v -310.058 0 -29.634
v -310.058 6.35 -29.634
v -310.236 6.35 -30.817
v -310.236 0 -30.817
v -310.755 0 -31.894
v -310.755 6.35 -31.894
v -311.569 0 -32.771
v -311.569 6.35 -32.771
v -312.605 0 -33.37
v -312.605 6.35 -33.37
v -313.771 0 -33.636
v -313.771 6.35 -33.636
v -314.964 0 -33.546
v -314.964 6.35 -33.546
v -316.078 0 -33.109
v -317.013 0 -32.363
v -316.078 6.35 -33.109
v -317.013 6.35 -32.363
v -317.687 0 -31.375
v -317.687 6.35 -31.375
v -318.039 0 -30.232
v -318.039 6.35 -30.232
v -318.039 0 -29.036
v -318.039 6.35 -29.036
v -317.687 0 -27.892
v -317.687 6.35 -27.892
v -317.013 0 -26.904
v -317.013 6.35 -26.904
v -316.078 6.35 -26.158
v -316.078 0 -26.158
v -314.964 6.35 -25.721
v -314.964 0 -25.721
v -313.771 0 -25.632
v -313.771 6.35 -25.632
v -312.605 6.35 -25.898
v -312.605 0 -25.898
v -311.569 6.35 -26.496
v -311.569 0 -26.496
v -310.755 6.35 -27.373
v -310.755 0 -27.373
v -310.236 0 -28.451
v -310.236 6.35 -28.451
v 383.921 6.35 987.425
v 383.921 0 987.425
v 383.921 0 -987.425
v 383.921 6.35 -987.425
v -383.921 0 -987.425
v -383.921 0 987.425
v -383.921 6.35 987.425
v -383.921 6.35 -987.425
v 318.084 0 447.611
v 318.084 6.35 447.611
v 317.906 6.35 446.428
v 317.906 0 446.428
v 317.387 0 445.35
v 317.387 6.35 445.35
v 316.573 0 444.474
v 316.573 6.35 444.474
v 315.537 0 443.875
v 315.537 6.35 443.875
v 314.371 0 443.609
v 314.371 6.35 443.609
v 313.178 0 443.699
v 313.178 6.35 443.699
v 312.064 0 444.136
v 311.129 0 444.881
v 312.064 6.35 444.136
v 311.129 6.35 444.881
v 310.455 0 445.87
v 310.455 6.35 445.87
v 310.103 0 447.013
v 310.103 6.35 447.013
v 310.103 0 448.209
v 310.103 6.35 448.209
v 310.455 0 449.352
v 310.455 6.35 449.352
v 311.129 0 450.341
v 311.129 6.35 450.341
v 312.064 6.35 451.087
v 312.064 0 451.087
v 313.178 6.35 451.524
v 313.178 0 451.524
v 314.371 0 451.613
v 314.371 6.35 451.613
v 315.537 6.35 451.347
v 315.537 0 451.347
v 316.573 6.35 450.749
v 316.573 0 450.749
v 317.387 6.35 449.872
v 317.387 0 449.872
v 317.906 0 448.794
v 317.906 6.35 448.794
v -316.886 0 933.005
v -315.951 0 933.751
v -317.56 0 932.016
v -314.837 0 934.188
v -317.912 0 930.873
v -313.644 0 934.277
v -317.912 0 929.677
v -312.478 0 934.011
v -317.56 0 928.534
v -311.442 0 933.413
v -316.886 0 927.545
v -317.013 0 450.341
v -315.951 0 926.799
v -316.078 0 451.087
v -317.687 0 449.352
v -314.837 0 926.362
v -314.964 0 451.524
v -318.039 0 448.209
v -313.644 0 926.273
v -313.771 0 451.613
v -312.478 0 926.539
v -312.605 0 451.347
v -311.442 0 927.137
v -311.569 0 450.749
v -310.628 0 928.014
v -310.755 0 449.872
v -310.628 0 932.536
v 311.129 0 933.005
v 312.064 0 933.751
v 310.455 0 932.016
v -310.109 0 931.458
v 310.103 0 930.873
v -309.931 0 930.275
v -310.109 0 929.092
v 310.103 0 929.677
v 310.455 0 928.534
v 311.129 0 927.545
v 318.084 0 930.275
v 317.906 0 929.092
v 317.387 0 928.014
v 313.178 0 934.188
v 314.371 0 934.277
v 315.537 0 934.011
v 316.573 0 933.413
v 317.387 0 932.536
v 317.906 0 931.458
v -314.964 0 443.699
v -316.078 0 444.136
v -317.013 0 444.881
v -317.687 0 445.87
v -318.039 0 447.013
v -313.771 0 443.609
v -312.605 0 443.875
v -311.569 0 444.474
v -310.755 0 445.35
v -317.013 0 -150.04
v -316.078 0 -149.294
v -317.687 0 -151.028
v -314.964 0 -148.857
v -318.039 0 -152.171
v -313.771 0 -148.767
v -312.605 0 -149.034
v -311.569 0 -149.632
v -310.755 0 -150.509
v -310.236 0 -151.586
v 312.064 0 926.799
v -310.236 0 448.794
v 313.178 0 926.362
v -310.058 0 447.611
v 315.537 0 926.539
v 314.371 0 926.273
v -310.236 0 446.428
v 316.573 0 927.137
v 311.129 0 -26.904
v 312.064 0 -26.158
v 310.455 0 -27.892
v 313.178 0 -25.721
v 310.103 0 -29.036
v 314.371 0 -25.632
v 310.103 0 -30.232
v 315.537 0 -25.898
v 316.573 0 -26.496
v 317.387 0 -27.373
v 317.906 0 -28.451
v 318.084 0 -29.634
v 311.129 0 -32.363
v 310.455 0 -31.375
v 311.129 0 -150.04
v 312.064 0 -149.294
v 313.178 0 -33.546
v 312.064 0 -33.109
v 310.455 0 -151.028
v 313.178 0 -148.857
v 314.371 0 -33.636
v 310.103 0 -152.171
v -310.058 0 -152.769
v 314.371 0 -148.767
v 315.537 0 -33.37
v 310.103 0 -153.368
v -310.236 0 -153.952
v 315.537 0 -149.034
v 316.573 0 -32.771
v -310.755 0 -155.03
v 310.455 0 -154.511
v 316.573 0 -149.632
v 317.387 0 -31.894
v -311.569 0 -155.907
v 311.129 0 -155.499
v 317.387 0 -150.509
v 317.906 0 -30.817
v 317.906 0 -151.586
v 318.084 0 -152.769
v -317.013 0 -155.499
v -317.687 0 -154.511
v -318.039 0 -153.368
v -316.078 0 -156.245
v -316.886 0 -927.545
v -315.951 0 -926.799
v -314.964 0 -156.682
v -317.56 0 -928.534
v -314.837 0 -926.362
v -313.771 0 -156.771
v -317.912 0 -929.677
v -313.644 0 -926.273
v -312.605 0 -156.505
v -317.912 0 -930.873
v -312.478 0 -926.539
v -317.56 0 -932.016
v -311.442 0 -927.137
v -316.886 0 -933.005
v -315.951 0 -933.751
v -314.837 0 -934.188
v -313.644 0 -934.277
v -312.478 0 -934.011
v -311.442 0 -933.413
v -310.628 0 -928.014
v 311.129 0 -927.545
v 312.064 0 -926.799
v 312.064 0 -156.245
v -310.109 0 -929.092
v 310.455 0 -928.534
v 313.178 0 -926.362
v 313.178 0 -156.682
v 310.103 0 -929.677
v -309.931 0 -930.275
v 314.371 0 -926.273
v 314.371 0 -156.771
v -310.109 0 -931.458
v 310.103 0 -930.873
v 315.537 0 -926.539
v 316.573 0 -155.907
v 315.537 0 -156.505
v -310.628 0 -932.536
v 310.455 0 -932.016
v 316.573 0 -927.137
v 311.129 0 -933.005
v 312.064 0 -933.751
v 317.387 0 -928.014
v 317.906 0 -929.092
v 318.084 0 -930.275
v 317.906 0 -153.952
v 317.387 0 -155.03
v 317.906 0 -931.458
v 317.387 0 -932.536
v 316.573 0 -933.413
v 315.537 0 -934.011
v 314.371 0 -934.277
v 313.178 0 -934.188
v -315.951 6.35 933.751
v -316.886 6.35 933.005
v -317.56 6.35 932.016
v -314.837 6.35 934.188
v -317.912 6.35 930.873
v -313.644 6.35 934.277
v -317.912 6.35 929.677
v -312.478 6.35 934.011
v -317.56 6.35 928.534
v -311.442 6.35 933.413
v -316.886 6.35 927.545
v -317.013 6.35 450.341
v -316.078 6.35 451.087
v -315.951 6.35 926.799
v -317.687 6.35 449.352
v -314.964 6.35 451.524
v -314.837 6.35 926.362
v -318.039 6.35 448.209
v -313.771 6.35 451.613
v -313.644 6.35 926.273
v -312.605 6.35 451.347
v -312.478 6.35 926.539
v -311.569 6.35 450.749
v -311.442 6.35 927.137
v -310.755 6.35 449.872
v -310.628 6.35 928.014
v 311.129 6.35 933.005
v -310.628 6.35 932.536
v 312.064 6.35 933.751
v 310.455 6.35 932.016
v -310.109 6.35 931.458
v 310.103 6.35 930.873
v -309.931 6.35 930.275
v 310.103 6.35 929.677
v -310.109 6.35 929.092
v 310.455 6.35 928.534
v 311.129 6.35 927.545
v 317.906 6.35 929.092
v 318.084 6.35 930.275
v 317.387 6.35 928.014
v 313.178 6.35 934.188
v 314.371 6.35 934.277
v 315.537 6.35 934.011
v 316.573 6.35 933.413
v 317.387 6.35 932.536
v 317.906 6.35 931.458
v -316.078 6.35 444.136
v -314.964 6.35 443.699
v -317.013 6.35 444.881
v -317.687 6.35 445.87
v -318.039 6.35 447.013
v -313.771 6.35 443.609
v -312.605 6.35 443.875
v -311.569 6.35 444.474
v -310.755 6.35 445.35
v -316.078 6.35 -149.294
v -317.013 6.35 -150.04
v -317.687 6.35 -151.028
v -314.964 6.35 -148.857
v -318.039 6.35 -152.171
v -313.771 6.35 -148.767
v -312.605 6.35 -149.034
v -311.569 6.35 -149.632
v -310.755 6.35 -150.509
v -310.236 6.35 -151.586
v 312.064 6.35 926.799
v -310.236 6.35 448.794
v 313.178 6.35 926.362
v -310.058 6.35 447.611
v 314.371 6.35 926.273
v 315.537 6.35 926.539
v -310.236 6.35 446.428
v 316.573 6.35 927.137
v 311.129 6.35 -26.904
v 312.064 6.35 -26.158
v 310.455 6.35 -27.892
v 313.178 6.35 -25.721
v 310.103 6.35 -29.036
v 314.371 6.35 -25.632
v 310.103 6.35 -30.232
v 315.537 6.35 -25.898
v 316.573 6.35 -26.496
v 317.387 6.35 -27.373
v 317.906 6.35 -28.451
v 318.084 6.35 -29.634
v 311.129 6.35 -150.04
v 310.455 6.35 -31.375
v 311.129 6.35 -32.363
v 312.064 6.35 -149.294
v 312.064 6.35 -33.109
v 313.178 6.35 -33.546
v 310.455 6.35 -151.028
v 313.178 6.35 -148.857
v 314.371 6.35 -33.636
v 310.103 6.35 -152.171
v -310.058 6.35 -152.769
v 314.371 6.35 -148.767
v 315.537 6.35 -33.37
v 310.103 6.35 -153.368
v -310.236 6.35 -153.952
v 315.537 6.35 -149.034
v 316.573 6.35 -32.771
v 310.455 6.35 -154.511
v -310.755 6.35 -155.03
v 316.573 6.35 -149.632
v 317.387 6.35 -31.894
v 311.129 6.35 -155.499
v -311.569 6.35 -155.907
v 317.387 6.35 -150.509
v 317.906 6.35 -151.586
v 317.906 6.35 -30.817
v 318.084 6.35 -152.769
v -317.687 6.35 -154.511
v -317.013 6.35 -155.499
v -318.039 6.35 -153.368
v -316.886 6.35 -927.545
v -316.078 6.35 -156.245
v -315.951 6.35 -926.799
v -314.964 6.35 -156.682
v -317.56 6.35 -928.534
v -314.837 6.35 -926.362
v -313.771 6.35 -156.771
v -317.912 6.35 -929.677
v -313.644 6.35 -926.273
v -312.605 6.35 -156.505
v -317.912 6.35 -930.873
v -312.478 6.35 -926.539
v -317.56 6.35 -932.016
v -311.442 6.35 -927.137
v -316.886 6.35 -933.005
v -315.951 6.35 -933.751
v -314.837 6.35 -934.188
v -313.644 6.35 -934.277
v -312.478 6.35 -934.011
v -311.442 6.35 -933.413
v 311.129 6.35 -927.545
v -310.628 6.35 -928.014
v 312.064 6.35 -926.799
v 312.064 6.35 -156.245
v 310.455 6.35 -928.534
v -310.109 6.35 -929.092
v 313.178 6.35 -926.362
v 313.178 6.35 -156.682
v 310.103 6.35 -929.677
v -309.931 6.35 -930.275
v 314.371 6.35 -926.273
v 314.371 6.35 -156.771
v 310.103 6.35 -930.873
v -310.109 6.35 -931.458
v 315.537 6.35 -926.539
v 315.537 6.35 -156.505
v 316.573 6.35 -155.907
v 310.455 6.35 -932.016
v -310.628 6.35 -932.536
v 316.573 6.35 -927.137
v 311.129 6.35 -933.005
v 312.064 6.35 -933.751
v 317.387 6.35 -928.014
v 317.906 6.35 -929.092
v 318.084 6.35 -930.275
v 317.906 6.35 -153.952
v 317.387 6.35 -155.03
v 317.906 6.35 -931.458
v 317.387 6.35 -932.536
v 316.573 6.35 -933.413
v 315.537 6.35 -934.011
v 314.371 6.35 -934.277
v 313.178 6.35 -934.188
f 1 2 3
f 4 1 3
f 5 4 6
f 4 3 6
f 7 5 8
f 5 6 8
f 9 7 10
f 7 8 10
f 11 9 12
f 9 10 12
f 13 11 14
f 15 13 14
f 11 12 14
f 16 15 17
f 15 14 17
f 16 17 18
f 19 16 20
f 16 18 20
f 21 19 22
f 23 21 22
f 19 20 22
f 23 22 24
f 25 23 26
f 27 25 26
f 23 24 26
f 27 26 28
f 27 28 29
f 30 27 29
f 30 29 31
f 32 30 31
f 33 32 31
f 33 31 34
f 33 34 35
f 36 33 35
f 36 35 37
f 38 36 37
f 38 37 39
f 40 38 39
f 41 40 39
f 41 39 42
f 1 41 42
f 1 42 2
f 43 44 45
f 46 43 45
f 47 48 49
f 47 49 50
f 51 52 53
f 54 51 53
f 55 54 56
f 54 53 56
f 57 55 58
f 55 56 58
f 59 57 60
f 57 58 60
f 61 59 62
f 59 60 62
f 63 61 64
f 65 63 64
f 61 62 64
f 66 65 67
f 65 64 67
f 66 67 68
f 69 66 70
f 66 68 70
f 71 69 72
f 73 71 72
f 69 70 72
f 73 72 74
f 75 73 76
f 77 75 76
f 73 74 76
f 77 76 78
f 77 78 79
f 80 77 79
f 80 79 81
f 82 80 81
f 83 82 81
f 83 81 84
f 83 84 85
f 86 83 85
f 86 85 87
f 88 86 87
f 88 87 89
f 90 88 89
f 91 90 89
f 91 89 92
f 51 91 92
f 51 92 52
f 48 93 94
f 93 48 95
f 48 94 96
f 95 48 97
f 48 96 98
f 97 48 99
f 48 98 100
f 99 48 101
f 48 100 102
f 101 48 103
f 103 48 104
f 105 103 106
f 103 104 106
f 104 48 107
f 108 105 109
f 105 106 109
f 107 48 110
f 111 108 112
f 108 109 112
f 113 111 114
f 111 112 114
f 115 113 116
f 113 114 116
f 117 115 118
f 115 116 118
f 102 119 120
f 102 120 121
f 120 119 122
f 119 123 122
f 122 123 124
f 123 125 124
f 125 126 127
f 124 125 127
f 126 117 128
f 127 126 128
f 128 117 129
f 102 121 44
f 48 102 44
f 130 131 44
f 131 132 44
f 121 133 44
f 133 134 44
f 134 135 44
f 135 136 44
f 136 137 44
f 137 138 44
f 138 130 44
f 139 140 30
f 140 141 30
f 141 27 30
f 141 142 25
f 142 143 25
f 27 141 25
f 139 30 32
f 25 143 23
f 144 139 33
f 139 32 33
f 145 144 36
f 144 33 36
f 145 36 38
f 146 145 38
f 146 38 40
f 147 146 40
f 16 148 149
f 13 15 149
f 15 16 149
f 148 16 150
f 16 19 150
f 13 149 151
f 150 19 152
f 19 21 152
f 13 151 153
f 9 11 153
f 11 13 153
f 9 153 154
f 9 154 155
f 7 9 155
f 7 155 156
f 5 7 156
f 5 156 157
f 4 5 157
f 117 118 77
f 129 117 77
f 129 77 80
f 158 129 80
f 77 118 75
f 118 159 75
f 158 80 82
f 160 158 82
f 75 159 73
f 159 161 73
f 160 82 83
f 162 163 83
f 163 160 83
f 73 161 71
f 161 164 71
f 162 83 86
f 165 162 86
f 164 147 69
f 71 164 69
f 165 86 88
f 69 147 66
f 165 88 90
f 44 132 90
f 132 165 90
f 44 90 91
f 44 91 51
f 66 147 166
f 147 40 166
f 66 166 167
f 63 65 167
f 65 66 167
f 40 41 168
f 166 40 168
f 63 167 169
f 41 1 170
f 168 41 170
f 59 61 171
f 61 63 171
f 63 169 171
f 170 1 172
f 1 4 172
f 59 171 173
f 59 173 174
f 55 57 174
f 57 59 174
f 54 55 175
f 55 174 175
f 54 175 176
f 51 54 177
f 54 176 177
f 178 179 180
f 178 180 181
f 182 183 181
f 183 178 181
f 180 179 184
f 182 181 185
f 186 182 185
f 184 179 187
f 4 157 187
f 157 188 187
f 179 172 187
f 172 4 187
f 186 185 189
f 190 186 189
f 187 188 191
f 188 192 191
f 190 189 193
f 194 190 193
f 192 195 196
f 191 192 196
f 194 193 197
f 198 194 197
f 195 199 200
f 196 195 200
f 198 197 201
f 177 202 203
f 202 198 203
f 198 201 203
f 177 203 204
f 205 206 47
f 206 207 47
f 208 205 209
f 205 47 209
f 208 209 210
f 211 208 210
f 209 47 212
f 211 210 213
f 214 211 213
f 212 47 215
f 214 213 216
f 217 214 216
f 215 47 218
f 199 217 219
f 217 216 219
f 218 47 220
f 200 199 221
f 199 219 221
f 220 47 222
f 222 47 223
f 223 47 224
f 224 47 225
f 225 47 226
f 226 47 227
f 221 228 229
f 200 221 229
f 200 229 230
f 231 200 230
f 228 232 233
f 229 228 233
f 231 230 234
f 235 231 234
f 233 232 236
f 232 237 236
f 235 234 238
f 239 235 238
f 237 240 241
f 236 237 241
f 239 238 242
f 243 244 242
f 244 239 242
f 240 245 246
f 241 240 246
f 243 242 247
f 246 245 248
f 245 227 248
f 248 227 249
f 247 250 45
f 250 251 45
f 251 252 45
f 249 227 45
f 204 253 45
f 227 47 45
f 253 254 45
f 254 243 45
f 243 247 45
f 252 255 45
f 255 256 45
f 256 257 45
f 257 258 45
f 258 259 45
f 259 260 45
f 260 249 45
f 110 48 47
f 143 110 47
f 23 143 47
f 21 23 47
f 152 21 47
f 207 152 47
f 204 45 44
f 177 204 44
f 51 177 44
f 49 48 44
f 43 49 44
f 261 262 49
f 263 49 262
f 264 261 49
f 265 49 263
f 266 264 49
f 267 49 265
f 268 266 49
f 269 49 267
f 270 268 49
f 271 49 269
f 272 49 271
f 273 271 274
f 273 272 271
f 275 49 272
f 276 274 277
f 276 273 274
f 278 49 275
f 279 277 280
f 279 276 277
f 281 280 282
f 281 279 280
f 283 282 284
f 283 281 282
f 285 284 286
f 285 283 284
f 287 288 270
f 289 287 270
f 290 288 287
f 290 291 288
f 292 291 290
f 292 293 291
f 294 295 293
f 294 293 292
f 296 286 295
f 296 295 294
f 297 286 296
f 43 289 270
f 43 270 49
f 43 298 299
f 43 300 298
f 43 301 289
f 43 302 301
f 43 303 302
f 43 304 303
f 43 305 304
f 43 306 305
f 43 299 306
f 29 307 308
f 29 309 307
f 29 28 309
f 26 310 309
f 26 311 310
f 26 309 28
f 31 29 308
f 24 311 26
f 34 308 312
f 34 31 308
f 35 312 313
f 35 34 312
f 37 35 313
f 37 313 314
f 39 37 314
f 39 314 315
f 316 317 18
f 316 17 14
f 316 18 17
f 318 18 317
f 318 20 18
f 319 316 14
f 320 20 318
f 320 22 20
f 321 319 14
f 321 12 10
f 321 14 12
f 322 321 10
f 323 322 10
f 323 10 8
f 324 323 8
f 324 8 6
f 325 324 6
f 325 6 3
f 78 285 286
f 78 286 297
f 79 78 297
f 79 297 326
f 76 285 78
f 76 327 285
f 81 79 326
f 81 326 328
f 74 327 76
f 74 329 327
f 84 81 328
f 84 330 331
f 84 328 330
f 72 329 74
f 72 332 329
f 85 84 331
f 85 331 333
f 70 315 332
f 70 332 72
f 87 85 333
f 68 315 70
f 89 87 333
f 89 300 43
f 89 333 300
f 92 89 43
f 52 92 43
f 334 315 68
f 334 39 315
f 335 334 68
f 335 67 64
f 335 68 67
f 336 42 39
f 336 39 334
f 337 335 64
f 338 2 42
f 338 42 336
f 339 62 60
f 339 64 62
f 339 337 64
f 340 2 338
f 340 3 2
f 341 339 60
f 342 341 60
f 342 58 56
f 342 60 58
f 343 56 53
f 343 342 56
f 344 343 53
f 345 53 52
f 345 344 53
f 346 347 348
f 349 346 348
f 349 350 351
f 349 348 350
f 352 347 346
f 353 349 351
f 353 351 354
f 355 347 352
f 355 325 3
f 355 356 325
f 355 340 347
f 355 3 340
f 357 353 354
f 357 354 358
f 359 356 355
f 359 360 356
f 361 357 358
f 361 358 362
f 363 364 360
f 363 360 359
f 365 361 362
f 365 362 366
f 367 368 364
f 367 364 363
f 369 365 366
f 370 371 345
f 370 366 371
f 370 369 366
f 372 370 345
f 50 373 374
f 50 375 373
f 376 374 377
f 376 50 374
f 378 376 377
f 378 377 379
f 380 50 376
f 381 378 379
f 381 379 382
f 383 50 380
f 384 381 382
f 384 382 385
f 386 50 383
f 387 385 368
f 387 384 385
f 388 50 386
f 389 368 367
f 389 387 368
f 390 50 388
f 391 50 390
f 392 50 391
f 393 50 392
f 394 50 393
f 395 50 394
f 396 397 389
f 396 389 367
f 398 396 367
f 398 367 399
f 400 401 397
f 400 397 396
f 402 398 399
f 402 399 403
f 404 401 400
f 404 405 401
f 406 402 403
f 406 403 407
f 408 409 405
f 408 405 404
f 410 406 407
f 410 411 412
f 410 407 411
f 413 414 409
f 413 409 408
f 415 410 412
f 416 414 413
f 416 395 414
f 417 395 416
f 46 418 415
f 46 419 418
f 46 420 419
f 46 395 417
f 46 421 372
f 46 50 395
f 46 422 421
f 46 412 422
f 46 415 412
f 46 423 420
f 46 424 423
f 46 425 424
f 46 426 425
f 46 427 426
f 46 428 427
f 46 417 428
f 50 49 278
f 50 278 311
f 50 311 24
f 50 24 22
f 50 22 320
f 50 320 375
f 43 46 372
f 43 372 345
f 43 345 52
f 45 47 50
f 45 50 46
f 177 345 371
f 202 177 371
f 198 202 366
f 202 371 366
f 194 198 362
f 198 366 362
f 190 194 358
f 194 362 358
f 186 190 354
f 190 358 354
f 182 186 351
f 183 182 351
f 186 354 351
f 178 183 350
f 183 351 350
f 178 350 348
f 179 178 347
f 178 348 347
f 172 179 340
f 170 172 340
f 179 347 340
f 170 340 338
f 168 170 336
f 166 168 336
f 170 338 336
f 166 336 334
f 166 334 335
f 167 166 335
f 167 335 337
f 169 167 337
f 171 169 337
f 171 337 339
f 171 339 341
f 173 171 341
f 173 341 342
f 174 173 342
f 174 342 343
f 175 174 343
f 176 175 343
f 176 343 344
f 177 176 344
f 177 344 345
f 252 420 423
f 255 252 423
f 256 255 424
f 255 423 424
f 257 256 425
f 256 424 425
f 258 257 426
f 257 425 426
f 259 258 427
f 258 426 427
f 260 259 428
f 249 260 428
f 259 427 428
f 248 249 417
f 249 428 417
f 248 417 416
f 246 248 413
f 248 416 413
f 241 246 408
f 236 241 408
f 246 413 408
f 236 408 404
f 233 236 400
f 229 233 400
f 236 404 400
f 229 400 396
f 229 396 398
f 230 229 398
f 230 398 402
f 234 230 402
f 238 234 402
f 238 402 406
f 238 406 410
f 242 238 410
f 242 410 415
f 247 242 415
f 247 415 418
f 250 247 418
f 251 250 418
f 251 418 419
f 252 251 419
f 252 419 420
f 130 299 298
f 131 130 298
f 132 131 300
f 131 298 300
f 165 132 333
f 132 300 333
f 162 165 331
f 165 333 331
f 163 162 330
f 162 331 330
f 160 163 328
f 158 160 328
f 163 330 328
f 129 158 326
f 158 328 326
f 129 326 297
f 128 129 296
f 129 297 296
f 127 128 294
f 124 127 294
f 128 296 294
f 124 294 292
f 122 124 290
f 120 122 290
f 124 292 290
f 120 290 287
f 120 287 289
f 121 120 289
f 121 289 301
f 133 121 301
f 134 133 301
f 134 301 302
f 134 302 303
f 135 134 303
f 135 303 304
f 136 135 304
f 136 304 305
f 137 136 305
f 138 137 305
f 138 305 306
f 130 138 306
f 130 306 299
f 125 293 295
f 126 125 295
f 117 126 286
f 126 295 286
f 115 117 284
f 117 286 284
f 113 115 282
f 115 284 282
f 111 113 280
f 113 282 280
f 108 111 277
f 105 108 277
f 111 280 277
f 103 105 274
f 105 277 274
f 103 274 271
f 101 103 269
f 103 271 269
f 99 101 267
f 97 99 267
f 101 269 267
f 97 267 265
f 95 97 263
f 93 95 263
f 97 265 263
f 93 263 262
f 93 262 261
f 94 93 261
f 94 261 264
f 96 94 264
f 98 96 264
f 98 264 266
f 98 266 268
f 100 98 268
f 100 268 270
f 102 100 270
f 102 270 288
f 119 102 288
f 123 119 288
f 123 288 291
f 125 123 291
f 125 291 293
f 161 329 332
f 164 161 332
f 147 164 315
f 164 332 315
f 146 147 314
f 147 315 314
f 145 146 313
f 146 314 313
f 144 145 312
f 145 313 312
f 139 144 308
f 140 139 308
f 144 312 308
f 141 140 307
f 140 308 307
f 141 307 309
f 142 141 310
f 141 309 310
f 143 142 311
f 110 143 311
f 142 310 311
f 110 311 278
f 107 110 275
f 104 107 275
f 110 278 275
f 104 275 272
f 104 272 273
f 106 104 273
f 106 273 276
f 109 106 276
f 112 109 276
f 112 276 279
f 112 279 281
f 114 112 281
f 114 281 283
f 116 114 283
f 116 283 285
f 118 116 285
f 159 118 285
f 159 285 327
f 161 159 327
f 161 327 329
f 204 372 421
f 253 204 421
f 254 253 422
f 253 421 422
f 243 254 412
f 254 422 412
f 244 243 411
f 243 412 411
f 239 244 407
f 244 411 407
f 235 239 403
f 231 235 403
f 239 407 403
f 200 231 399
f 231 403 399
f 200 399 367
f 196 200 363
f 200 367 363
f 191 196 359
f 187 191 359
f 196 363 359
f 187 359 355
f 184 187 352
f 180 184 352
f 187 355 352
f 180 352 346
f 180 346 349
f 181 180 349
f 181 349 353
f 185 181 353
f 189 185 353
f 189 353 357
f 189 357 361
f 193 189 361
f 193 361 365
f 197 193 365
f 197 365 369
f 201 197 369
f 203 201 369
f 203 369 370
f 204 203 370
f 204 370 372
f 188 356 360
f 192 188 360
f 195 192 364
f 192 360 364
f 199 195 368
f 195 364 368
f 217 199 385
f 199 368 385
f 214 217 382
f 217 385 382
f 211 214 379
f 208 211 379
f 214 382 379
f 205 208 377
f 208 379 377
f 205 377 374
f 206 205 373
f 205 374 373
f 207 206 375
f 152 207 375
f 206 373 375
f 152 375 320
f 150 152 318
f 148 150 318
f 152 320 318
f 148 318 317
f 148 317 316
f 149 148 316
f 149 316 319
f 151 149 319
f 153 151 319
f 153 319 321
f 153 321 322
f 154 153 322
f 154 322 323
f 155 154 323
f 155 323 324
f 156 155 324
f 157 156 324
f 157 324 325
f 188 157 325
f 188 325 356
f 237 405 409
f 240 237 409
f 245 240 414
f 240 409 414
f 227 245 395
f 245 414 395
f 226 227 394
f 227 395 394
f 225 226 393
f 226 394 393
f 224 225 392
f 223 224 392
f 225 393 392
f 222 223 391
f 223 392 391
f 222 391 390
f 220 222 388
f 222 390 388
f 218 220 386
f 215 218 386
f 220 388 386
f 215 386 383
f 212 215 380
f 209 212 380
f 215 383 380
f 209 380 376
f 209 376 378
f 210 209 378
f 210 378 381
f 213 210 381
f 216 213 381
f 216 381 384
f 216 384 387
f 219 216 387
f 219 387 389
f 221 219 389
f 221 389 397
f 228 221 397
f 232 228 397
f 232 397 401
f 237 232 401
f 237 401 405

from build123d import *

# Parameters (mm, degrees)
SKETCH1_W                = 767.842
SKETCH1_H                = 1974.85
BOSS_EXTRUDE1_DEPTH      = 6.35
J_0_277_DIAMETER_HOLE1_D = 8.0264


with BuildPart() as part:
    # Sketch1 → Boss-Extrude1 (new body)
    with BuildSketch(Plane(origin=(0, 0, 0), x_dir=(1, 0, 0), z_dir=(0, 1, 0))):
        Rectangle(SKETCH1_W, SKETCH1_H)
    extrude(amount=BOSS_EXTRUDE1_DEPTH)

    # J (0.277) Diameter Hole1 (through all)
    with Locations(Plane(origin=(0, 0, 0), x_dir=(-1, 0, 0), z_dir=(0, -1, 0))):
        with Locations((-314.071, -930.275), (313.944, -930.275), (-314.071, 29.633738777), (314.071, 29.633738777), (313.944, 930.275), (-314.071, 930.275), (-314.071, 152.769407652), (314.071, 152.769407652), (-314.071, -447.611159485), (314.071, -447.611159485)):
            Hole(J_0_277_DIAMETER_HOLE1_D / 2)


solid = part.part
